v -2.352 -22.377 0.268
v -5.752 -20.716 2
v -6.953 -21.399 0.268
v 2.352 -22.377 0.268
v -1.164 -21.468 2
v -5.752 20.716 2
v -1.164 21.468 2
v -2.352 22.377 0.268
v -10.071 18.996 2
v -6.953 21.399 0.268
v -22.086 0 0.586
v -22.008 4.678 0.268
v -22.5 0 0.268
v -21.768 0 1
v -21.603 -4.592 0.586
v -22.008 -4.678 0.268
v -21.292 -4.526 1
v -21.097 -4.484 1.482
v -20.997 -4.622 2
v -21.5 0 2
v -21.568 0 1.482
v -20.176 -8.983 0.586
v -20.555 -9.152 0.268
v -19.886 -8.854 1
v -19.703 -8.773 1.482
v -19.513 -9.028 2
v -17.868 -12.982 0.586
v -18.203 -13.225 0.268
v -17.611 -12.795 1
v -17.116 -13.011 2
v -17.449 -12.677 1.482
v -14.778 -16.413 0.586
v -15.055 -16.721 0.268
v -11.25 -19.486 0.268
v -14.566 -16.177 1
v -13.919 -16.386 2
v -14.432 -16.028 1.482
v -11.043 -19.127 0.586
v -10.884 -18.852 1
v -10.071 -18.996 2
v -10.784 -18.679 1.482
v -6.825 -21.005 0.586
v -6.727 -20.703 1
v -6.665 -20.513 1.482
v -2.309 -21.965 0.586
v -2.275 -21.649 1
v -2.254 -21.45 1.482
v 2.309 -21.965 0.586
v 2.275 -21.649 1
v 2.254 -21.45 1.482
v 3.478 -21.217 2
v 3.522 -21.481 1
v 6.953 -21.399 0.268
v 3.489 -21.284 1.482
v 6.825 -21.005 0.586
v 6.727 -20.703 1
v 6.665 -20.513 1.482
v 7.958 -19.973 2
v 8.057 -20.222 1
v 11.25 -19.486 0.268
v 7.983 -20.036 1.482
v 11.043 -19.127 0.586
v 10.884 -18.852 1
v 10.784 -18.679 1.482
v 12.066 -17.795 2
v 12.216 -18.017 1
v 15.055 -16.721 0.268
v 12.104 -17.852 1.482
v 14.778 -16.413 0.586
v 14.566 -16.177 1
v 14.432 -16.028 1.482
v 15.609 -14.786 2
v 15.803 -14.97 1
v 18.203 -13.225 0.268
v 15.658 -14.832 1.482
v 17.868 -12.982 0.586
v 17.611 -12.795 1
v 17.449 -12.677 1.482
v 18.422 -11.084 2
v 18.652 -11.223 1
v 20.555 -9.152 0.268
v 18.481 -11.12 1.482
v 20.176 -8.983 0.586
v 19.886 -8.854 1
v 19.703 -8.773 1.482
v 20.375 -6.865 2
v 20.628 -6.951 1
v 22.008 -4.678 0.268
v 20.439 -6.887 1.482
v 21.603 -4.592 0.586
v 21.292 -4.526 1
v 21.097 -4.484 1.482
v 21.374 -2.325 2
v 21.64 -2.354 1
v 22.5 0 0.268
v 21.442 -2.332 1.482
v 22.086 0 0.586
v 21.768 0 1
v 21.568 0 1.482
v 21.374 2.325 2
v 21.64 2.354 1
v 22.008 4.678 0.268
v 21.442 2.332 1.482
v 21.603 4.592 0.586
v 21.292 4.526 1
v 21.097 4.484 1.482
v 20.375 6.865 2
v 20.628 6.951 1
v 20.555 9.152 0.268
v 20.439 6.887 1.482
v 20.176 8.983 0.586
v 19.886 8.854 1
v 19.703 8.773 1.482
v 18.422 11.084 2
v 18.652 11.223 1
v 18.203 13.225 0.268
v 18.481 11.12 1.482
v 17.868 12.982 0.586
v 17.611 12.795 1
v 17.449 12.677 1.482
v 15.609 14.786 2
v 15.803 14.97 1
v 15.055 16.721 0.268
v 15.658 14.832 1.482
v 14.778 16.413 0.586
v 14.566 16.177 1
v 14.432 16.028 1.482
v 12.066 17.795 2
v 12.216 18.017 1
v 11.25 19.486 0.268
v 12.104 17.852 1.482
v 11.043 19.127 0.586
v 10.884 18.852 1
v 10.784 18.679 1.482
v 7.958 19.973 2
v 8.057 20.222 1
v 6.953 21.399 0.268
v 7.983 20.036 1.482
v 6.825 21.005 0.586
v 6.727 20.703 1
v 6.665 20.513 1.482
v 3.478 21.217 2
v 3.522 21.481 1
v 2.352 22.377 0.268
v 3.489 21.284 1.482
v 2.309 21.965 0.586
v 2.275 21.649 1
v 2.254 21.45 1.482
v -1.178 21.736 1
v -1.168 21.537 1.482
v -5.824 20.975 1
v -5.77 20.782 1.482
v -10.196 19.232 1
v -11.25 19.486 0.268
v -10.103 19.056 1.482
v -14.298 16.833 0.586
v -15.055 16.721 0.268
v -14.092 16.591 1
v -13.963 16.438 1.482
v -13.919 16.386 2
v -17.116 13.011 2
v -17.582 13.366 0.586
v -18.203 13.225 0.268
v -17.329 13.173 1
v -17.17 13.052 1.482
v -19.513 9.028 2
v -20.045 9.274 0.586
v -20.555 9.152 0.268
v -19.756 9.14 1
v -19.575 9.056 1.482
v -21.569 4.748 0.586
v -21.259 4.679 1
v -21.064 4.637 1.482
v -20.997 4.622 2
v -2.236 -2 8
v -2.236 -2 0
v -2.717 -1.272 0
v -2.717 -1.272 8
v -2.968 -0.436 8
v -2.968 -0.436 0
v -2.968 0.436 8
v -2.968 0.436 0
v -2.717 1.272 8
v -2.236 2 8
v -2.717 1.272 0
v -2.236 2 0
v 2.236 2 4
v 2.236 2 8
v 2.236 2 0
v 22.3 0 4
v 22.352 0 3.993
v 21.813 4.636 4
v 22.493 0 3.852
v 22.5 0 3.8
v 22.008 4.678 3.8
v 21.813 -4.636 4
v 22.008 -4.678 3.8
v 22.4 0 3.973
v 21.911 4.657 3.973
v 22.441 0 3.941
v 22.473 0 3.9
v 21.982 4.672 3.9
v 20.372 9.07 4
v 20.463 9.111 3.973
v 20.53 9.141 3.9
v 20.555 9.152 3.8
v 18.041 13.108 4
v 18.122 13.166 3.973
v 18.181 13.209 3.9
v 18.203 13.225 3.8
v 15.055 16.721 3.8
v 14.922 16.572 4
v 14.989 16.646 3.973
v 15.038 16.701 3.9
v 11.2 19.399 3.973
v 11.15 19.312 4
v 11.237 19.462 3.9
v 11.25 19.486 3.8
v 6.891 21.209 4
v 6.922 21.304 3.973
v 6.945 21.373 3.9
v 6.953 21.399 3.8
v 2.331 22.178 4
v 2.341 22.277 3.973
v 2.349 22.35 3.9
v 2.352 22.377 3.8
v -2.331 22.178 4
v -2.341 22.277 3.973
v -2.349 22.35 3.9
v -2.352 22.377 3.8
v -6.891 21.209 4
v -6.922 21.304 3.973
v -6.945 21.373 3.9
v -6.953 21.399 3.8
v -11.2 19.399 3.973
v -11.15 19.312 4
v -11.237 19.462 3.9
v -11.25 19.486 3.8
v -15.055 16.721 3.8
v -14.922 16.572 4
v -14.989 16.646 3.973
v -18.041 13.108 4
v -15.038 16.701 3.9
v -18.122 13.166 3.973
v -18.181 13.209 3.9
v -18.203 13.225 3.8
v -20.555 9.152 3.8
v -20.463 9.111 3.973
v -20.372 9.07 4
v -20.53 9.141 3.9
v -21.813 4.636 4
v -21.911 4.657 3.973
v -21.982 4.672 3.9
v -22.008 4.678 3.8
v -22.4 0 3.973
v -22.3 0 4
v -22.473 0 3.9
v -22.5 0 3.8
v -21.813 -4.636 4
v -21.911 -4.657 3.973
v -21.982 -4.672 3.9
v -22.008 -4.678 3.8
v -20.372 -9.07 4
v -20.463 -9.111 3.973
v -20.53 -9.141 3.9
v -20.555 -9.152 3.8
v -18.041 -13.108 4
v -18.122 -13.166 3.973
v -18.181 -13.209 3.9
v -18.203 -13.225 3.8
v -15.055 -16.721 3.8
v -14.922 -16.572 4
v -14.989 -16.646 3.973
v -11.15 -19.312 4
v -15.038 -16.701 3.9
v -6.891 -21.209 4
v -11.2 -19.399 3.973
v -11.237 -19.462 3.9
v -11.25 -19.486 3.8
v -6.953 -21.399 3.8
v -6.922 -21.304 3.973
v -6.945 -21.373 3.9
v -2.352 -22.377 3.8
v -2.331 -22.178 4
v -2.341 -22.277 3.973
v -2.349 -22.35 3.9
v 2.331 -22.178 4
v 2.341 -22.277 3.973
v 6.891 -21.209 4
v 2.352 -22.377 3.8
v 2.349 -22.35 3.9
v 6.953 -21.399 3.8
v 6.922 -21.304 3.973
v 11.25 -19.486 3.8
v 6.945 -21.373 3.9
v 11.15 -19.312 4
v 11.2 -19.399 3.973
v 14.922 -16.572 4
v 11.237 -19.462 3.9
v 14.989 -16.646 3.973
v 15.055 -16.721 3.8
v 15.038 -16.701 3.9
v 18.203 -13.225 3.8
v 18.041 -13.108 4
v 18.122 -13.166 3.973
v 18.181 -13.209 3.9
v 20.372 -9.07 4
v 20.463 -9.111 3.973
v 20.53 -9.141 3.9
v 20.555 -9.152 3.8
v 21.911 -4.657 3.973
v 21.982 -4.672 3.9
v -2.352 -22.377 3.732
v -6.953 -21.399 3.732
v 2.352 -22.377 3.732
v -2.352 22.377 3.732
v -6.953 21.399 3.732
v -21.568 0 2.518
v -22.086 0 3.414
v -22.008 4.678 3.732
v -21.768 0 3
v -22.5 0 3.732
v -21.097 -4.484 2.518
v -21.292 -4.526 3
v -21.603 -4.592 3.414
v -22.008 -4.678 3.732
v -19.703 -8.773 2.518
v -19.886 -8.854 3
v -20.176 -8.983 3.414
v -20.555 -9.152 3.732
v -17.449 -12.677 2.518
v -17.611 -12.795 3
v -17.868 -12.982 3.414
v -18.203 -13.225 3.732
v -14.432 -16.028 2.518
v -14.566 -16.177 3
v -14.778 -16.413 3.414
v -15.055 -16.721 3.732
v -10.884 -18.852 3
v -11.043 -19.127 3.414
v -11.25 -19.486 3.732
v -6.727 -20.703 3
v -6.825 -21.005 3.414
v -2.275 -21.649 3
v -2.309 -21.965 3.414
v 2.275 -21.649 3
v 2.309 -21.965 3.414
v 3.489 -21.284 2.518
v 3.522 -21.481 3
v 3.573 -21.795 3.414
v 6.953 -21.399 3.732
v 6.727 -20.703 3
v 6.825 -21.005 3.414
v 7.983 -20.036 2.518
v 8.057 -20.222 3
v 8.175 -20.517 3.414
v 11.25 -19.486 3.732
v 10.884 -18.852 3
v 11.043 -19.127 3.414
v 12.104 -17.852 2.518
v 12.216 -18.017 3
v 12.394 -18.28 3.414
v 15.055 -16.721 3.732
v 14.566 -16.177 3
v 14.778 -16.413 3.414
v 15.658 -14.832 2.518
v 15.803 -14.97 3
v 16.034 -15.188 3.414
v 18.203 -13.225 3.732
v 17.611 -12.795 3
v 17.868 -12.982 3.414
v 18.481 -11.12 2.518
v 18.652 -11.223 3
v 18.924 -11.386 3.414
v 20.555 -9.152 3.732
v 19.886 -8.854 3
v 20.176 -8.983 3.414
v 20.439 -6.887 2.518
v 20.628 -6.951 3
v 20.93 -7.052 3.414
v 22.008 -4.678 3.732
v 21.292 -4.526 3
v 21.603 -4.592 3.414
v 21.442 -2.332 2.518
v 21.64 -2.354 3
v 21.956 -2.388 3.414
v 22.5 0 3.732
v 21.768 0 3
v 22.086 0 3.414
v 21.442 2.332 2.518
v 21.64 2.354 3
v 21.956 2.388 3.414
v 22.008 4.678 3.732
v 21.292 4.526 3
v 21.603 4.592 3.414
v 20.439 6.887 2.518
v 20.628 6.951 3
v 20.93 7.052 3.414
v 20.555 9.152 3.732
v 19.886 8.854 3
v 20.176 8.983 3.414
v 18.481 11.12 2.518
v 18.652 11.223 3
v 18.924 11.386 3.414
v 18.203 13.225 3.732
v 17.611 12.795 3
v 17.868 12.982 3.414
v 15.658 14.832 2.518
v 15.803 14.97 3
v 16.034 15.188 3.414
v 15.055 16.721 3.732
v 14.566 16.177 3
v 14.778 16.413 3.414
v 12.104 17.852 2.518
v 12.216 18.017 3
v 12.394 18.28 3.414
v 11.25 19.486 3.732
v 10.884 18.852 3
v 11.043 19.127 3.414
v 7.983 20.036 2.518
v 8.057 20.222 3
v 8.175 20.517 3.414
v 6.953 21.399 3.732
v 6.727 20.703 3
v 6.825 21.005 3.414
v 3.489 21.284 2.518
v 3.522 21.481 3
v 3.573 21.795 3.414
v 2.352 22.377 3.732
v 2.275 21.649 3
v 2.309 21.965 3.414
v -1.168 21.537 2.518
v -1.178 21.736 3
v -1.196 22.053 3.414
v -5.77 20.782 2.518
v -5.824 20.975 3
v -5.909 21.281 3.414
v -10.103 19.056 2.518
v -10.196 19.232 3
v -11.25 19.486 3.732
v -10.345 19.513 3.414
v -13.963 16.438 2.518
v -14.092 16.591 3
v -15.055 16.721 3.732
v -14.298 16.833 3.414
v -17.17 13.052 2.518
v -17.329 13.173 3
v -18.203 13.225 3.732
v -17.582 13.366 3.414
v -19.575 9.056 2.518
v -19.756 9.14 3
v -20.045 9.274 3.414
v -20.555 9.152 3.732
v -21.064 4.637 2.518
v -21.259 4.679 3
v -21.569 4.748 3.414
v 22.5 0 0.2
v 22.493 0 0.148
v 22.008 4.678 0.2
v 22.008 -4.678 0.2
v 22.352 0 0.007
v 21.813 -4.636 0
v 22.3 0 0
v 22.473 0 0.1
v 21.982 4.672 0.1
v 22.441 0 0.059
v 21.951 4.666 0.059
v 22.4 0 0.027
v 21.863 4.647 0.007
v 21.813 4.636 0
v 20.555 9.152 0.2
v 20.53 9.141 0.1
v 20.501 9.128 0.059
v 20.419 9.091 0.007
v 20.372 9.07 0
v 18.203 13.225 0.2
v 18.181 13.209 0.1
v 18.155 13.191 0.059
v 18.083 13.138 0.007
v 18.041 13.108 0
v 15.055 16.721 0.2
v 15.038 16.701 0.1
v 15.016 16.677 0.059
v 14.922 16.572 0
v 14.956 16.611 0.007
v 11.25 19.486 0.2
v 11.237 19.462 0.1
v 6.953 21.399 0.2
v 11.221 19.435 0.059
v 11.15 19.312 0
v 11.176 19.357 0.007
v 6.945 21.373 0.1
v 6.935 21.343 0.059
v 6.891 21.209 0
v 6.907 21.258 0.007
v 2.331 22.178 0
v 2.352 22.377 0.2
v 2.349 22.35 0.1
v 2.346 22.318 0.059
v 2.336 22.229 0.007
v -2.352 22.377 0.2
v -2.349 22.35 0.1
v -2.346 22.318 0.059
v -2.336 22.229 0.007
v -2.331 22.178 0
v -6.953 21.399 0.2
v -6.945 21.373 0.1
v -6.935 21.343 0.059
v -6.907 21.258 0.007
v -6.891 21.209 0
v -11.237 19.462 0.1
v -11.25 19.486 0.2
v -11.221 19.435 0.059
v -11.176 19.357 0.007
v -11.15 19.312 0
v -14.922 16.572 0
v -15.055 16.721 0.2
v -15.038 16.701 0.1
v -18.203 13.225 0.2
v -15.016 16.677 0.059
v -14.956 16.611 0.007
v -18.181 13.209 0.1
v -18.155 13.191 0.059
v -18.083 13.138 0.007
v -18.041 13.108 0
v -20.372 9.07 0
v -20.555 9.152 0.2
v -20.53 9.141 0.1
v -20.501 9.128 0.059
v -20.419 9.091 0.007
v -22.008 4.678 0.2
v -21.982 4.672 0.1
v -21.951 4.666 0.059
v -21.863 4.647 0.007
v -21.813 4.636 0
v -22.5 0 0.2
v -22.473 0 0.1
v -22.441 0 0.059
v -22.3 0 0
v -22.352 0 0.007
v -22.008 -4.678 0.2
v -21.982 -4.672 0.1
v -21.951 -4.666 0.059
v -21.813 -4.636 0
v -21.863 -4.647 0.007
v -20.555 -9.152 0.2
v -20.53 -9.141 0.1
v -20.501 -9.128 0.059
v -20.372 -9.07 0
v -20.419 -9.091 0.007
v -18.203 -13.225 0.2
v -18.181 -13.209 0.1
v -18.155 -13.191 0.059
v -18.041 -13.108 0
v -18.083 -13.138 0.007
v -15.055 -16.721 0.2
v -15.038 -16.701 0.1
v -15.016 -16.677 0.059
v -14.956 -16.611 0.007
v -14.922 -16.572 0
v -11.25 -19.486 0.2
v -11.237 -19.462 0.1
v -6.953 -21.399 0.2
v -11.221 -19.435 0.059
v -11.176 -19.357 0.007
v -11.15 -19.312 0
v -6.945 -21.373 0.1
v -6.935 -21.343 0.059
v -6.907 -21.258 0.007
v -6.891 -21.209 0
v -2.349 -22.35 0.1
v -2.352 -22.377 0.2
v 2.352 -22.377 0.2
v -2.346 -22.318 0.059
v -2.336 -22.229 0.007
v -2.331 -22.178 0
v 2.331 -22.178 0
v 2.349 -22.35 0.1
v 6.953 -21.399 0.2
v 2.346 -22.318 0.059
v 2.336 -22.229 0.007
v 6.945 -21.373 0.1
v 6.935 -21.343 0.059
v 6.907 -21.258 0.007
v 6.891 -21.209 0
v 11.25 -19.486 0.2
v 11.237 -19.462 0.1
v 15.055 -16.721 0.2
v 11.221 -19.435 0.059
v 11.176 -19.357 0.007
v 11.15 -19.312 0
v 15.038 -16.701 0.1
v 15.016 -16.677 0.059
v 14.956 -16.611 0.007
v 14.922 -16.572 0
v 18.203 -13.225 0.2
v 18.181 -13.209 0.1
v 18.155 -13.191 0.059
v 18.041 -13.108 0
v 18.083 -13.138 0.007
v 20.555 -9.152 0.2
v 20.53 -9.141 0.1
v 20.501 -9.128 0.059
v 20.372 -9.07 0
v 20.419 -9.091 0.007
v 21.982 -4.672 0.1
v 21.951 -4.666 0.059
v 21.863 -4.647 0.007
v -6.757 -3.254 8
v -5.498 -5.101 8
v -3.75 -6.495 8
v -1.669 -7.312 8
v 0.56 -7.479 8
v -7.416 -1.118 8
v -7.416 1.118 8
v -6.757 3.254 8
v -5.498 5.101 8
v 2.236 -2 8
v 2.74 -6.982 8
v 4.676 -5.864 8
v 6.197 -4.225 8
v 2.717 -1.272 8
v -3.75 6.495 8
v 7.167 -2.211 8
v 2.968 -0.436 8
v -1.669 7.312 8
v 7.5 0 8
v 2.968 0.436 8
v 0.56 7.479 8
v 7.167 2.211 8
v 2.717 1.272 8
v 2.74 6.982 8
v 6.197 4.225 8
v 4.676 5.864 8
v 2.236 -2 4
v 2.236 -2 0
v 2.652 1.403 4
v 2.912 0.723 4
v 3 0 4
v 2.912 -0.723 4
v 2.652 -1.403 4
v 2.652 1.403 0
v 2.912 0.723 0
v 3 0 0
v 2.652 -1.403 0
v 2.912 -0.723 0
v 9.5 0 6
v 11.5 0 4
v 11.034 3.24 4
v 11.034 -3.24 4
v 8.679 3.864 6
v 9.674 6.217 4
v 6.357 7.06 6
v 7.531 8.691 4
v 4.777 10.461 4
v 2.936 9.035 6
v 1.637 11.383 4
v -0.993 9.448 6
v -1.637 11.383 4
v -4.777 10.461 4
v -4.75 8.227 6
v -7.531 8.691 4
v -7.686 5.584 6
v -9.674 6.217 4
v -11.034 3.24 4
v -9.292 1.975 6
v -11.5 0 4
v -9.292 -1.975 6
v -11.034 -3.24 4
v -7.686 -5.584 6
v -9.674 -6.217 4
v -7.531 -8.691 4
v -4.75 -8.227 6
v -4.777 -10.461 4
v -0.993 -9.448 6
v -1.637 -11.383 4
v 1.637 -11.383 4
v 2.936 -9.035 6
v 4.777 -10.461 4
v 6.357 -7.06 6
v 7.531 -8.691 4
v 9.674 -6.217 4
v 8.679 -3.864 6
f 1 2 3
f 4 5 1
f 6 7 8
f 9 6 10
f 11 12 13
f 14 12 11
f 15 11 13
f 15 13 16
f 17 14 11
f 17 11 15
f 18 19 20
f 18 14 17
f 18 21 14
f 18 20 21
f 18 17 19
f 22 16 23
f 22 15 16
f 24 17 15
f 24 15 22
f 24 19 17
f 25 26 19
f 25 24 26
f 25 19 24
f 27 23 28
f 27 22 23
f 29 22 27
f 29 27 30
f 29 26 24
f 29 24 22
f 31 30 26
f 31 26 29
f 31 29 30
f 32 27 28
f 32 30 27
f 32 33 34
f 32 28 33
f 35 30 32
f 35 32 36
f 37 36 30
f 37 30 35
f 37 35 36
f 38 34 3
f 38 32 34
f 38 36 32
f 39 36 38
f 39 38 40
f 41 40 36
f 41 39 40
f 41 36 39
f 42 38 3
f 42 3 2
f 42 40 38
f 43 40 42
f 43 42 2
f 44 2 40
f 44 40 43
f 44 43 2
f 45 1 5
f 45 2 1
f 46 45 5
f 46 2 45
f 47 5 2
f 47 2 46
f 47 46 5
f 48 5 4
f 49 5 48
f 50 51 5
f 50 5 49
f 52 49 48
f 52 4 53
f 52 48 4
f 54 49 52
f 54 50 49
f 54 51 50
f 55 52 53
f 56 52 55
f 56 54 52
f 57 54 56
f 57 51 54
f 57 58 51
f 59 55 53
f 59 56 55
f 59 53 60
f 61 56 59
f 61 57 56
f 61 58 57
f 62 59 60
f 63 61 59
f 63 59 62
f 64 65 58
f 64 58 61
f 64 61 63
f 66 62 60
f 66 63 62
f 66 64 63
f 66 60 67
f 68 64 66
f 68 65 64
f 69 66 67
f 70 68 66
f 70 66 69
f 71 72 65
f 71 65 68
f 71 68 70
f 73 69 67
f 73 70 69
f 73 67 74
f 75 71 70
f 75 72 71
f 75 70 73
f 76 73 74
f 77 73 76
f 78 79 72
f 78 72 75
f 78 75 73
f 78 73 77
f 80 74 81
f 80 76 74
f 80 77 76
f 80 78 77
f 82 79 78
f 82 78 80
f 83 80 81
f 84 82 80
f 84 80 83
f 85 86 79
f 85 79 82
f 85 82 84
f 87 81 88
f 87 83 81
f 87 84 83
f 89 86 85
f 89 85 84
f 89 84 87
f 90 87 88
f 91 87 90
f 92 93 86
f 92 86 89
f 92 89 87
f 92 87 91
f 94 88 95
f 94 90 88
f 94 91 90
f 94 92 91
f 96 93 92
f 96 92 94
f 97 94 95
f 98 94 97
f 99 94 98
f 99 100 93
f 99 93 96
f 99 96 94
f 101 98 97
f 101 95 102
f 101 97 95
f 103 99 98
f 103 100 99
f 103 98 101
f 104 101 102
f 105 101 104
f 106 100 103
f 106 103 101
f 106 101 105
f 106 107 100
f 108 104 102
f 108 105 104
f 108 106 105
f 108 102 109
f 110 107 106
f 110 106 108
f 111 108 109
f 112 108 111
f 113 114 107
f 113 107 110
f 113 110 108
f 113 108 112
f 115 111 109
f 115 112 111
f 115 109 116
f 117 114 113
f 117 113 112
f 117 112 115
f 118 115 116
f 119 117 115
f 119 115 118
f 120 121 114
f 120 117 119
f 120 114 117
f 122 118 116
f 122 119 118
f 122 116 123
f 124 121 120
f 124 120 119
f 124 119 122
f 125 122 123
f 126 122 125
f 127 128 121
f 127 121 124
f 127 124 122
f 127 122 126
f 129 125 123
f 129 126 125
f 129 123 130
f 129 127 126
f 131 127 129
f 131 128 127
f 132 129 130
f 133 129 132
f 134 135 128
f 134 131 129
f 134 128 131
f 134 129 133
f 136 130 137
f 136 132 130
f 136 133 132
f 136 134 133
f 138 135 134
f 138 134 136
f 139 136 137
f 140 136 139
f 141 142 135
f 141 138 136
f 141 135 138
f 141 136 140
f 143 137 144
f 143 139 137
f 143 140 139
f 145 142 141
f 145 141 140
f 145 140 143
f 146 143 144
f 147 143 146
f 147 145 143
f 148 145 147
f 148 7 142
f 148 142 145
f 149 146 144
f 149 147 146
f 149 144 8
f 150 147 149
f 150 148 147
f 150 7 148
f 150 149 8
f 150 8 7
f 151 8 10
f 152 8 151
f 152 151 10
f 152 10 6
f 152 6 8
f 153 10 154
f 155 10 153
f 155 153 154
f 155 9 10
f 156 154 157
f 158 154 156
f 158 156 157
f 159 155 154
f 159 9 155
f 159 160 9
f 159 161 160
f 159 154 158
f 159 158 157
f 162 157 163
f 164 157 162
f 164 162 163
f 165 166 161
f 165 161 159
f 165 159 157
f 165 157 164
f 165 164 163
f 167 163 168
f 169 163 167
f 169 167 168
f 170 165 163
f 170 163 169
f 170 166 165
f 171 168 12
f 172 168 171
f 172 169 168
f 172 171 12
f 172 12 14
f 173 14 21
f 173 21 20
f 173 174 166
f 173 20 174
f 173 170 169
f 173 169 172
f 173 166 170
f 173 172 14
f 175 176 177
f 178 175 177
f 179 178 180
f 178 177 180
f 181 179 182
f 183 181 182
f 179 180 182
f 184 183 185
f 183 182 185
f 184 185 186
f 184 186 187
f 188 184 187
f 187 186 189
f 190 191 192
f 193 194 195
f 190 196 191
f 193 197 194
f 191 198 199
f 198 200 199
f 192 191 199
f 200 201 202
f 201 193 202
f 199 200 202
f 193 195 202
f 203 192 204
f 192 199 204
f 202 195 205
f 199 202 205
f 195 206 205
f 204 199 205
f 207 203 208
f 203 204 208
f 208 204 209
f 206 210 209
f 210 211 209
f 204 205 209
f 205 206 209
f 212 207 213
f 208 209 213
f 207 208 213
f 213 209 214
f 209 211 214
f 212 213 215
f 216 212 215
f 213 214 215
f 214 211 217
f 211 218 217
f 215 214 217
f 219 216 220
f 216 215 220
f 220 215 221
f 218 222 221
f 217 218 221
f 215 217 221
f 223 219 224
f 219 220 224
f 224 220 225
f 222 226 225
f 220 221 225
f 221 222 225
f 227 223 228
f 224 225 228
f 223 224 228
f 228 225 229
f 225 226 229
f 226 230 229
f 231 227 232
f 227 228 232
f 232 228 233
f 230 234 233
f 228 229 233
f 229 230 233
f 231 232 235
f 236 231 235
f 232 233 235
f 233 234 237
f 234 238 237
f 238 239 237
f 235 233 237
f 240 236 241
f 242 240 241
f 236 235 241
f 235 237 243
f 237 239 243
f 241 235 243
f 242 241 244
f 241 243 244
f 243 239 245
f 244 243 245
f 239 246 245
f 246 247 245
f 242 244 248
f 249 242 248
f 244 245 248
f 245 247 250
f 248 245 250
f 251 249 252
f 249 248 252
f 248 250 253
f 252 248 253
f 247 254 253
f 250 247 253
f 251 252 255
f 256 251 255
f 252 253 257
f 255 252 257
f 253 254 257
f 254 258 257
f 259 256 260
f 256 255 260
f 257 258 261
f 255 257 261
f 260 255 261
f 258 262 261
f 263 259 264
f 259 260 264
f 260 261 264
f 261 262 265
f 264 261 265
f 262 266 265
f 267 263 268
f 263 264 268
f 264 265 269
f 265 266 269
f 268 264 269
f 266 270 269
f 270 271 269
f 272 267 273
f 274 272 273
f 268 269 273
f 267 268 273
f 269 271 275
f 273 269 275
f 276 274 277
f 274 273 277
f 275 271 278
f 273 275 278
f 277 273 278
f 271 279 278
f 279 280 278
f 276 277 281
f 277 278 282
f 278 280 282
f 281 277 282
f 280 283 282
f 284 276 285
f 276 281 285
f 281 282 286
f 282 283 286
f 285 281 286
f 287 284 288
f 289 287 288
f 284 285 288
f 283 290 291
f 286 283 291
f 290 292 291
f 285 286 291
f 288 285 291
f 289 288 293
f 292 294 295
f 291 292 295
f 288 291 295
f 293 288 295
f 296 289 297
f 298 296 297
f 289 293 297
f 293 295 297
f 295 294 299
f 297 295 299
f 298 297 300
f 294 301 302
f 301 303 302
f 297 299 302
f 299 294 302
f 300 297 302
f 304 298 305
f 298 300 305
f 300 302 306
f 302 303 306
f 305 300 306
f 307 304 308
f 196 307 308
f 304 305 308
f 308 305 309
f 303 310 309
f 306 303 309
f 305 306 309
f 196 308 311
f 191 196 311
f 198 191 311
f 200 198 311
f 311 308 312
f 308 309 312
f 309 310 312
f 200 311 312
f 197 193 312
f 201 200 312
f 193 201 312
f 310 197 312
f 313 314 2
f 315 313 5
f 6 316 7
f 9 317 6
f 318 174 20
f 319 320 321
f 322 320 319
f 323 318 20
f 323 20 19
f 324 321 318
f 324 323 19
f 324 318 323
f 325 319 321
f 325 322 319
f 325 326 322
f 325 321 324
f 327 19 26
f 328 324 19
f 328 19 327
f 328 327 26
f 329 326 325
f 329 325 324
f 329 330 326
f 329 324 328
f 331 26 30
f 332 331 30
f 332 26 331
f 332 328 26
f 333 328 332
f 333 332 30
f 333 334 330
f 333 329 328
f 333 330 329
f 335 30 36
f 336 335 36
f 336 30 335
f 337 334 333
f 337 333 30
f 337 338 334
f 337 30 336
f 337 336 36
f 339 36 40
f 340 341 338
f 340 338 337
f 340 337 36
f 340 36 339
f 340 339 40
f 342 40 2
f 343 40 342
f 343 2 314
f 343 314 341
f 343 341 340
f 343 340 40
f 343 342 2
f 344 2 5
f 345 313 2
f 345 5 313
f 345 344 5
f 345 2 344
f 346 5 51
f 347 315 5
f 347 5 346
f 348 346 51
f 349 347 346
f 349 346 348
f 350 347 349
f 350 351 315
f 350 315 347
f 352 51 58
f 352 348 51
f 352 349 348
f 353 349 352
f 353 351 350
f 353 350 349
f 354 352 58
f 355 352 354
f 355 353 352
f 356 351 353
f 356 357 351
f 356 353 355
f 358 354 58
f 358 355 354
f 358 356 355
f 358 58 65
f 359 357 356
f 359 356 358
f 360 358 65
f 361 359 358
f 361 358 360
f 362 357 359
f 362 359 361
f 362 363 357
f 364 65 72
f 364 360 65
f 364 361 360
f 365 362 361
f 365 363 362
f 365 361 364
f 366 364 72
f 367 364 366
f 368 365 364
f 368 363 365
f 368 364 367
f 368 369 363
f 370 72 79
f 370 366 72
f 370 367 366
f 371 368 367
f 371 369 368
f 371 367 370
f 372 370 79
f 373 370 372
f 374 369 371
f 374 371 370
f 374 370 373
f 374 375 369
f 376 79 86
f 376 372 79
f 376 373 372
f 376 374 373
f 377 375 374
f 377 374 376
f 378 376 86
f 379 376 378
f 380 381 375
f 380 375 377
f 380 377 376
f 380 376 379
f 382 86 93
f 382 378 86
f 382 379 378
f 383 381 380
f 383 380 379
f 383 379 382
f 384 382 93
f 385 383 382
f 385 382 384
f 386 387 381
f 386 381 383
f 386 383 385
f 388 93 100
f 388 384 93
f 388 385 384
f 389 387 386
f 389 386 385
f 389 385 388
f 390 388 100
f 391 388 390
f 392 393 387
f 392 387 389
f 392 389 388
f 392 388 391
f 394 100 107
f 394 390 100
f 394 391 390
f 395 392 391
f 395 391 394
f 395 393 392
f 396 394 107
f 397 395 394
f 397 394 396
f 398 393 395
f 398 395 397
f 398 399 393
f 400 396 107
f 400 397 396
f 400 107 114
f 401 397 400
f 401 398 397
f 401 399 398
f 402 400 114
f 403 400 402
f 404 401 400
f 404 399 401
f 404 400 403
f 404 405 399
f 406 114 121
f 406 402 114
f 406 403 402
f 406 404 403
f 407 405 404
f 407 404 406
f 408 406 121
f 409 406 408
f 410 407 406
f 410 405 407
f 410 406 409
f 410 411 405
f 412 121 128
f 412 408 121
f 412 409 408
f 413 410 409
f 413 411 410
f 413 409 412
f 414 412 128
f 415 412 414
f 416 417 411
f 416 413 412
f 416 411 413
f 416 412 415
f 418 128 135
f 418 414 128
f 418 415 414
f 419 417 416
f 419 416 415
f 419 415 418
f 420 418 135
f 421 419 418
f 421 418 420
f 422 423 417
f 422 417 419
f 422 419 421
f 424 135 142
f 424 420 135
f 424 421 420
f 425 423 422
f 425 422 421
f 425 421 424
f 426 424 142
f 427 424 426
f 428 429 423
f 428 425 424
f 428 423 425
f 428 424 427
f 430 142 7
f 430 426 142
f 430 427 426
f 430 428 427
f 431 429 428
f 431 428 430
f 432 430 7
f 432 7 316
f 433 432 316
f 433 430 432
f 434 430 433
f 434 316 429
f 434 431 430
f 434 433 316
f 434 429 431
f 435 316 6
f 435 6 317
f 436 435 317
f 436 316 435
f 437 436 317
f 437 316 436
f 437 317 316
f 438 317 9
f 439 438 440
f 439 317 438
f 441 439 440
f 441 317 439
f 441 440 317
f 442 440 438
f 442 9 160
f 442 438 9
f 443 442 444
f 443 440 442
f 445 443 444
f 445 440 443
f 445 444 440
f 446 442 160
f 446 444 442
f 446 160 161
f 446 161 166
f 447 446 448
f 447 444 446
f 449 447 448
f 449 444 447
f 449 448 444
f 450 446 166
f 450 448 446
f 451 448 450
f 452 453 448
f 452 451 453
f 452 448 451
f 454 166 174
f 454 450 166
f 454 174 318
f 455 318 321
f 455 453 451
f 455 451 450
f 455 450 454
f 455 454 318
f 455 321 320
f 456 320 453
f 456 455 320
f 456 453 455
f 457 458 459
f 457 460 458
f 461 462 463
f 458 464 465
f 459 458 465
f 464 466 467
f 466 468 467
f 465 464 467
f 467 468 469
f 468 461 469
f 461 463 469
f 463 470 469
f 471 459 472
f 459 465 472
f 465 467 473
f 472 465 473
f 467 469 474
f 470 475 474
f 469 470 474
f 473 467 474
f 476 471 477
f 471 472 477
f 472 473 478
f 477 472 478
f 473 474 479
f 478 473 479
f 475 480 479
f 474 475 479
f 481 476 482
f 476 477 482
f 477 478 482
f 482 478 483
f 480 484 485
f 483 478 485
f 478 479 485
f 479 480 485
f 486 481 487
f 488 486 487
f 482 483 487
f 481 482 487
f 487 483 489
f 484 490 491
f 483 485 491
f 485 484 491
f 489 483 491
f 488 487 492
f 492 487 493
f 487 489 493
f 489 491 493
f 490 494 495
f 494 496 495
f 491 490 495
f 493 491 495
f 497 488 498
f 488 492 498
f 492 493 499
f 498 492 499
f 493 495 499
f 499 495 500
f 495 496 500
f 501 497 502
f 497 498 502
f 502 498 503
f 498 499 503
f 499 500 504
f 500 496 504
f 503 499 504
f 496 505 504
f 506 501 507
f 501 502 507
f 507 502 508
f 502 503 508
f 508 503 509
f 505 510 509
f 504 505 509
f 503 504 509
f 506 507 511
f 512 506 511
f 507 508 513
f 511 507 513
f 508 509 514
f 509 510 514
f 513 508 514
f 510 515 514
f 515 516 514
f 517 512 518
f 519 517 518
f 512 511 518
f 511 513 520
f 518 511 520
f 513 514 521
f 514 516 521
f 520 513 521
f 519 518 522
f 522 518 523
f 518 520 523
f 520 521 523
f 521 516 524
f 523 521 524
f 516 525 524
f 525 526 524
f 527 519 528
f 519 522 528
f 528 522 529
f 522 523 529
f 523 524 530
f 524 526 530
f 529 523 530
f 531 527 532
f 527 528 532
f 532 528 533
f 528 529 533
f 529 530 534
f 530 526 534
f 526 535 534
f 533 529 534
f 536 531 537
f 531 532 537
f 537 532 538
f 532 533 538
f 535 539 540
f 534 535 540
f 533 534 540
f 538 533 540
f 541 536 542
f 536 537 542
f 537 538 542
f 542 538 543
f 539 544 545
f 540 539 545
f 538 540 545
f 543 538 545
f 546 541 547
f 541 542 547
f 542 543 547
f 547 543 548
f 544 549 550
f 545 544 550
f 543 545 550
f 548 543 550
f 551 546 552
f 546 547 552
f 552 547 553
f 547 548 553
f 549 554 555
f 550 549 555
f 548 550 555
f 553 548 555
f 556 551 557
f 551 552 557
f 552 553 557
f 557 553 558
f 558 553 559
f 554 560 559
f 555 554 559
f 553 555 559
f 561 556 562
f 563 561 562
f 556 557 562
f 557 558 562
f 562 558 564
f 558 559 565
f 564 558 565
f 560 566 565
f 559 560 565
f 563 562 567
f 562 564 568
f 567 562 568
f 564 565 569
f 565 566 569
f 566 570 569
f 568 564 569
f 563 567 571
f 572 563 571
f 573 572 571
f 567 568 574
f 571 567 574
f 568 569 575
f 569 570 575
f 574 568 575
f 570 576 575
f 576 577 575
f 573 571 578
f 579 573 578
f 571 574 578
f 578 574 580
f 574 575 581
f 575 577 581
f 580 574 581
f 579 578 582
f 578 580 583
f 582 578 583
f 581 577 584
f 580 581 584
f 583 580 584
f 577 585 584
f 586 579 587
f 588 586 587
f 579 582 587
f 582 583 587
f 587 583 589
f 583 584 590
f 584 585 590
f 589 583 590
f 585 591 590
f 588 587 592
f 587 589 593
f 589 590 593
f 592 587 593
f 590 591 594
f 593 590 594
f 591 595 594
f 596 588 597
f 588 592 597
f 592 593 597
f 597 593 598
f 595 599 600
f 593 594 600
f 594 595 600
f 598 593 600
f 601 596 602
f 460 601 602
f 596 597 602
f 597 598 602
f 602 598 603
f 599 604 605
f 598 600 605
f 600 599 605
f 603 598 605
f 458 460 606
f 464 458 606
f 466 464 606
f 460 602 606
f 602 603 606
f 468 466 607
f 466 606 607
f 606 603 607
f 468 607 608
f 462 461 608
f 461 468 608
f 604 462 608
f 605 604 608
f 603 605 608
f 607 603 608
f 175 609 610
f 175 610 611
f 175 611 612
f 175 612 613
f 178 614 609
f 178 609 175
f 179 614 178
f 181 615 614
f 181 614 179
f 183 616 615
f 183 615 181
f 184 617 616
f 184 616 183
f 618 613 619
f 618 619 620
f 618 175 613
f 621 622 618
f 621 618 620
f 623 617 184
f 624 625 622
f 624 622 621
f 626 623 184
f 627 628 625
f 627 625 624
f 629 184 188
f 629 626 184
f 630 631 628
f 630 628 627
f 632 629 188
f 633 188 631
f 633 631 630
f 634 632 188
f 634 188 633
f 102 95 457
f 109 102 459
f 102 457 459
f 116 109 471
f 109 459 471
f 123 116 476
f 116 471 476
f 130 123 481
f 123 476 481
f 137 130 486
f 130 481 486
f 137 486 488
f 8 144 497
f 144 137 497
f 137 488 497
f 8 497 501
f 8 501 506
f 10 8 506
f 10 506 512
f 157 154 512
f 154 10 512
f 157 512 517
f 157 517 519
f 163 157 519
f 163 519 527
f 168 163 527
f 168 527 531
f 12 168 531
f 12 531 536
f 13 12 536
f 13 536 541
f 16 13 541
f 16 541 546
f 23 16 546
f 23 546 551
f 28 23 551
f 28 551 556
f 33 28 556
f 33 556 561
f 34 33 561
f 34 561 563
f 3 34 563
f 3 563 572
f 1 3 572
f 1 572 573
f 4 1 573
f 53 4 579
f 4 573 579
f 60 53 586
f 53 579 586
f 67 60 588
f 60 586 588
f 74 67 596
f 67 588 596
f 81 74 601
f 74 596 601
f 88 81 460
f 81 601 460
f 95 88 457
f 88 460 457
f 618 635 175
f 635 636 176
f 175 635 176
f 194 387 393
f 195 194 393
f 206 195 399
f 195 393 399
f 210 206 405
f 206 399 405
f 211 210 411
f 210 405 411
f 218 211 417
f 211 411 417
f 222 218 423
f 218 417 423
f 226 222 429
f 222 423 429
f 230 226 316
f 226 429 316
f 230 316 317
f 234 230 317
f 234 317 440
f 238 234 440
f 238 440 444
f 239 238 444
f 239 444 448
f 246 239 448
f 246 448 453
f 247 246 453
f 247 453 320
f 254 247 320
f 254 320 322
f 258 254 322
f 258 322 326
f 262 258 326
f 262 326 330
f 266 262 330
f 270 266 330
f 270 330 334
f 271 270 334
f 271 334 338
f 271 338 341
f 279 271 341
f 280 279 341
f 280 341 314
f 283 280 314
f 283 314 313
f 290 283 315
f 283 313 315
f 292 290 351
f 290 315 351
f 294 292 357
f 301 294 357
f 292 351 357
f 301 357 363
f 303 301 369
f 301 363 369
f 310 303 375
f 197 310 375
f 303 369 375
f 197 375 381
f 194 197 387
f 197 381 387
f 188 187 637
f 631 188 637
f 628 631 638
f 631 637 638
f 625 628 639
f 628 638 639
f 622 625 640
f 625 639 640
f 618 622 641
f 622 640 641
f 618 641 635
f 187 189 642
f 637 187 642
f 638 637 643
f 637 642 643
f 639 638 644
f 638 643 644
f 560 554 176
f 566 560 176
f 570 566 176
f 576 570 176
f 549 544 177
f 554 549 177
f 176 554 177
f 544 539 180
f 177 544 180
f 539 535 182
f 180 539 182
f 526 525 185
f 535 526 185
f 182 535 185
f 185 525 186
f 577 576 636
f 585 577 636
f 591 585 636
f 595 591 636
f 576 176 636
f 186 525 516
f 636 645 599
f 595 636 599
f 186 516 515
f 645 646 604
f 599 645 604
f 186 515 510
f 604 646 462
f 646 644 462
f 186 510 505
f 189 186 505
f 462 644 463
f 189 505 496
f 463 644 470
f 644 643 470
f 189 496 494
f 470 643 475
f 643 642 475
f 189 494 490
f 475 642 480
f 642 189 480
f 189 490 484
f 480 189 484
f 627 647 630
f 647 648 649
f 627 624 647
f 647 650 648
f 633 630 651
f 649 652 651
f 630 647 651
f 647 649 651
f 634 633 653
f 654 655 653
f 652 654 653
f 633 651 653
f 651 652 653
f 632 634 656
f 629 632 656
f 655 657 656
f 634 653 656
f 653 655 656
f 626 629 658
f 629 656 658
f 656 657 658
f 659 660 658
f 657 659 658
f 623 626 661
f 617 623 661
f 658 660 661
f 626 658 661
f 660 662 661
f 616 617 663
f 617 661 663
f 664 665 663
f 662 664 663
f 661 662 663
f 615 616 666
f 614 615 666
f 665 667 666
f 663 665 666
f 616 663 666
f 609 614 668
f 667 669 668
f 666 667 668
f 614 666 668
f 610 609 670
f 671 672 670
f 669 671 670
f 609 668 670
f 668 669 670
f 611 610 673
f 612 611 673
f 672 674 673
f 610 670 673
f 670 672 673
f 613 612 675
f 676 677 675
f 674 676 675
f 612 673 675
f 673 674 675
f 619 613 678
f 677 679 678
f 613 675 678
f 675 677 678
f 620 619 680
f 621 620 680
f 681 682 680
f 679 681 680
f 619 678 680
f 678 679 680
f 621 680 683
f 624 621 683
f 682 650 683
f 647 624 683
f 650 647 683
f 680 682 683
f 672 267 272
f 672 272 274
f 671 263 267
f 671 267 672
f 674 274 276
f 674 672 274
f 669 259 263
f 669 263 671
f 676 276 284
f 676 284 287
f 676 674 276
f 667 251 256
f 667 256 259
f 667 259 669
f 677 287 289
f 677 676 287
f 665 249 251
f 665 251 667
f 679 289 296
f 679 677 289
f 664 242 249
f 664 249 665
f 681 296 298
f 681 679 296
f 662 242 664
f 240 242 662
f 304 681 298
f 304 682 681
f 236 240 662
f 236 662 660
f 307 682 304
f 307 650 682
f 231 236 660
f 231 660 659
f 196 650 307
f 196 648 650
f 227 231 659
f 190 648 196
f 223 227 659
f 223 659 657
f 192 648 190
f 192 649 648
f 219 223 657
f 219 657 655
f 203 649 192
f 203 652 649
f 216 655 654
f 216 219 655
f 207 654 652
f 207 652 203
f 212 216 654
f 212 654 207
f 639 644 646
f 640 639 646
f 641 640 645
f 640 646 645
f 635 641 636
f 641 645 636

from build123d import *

# Parameters (mm, degrees)
F0_R     = 22.5
F1_DEPTH = 4
F2_R     = 2
F4_R     = 0.2
F5_R     = 12.5
F6_DEPTH = 4


# Not quite as in the source:
# - a fillet or chamfer that OpenCascade refuses, or shapes differently, is made with other operations: its cross-section is extruded or revolved along the edge and cut away or added


with BuildPart() as f1:
    # F0 (on Top) → F1 (new body)
    with BuildSketch(Plane.XY):
        Circle(F0_R)
        with BuildLine():
            ThreePointArc((2.2360679775, 2), (2.8025170769, 1.0704662693), (3, 0))
            ThreePointArc((3, 0), (2.8025170769, -1.0704662693), (2.2360679775, -2))
            ThreePointArc((2.2360679775, -2), (0, -3), (-2.2360679775, -2))
            ThreePointArc((-2.2360679775, -2), (-3, 0), (-2.2360679775, 2))
            ThreePointArc((-2.2360679775, 2), (0, 3), (2.2360679775, 2))
        make_face(mode=Mode.SUBTRACT)
        with BuildLine():
            ThreePointArc((-2.2360679775, -2), (0, -3), (2.2360679775, -2))
            Line((2.2360679775, -2), (-2.2360679775, -2))
        make_face()
        with BuildLine():
            Line((-2.2360679775, 2), (2.2360679775, 2))
            ThreePointArc((2.2360679775, 2), (0, 3), (-2.2360679775, 2))
        make_face()
    extrude(amount=F1_DEPTH)

    # F2 (on Front) → F3 (revolve, cut)
    with BuildSketch(Plane.XZ):
        with Locations((-23.5, 2)):
            Circle(F2_R)
    revolve(axis=Axis((0, 0, 4), (0, 0, 1)), mode=Mode.SUBTRACT)

    # F4
    f4_edges = [f1.edges().sort_by_distance(p)[0] for p in [
        (-22.5, 0, 4),
        (-22.5, 0, 0),
    ]]
    fillet(f4_edges, radius=F4_R)

    # F5 (on face) → F6 (join)
    with BuildSketch(Plane.XY.offset(4)):
        Circle(F5_R)
        with BuildLine():
            Line((2.2360679775, -2), (-2.2360679775, -2))
            ThreePointArc((-2.2360679775, -2), (-3, 0), (-2.2360679775, 2))
            Line((-2.2360679775, 2), (2.2360679775, 2))
            ThreePointArc((2.2360679775, 2), (3, 0), (2.2360679775, -2))
        make_face(mode=Mode.SUBTRACT)
    extrude(amount=F6_DEPTH)

    # F7: chamfer of 5 on 1 edges, made by hand


with BuildPart() as f7_tool2:
    # F7_s3 → F7_t4 (revolve)
    with BuildSketch(Plane.XZ):
        Polygon((7.5, 8), (12.5, 3), (12.5, 8), align=None)
    revolve(axis=Axis((0, 0, 8), (0, 0, 1)))

    split(bisect_by=Plane.XY.offset(4), keep=Keep.TOP)


with BuildPart() as f1_1:
    add(f1.part)

    # F7_t1: cut F7_tool2
    add(f7_tool2.part, mode=Mode.SUBTRACT)


solid = f1_1.part
